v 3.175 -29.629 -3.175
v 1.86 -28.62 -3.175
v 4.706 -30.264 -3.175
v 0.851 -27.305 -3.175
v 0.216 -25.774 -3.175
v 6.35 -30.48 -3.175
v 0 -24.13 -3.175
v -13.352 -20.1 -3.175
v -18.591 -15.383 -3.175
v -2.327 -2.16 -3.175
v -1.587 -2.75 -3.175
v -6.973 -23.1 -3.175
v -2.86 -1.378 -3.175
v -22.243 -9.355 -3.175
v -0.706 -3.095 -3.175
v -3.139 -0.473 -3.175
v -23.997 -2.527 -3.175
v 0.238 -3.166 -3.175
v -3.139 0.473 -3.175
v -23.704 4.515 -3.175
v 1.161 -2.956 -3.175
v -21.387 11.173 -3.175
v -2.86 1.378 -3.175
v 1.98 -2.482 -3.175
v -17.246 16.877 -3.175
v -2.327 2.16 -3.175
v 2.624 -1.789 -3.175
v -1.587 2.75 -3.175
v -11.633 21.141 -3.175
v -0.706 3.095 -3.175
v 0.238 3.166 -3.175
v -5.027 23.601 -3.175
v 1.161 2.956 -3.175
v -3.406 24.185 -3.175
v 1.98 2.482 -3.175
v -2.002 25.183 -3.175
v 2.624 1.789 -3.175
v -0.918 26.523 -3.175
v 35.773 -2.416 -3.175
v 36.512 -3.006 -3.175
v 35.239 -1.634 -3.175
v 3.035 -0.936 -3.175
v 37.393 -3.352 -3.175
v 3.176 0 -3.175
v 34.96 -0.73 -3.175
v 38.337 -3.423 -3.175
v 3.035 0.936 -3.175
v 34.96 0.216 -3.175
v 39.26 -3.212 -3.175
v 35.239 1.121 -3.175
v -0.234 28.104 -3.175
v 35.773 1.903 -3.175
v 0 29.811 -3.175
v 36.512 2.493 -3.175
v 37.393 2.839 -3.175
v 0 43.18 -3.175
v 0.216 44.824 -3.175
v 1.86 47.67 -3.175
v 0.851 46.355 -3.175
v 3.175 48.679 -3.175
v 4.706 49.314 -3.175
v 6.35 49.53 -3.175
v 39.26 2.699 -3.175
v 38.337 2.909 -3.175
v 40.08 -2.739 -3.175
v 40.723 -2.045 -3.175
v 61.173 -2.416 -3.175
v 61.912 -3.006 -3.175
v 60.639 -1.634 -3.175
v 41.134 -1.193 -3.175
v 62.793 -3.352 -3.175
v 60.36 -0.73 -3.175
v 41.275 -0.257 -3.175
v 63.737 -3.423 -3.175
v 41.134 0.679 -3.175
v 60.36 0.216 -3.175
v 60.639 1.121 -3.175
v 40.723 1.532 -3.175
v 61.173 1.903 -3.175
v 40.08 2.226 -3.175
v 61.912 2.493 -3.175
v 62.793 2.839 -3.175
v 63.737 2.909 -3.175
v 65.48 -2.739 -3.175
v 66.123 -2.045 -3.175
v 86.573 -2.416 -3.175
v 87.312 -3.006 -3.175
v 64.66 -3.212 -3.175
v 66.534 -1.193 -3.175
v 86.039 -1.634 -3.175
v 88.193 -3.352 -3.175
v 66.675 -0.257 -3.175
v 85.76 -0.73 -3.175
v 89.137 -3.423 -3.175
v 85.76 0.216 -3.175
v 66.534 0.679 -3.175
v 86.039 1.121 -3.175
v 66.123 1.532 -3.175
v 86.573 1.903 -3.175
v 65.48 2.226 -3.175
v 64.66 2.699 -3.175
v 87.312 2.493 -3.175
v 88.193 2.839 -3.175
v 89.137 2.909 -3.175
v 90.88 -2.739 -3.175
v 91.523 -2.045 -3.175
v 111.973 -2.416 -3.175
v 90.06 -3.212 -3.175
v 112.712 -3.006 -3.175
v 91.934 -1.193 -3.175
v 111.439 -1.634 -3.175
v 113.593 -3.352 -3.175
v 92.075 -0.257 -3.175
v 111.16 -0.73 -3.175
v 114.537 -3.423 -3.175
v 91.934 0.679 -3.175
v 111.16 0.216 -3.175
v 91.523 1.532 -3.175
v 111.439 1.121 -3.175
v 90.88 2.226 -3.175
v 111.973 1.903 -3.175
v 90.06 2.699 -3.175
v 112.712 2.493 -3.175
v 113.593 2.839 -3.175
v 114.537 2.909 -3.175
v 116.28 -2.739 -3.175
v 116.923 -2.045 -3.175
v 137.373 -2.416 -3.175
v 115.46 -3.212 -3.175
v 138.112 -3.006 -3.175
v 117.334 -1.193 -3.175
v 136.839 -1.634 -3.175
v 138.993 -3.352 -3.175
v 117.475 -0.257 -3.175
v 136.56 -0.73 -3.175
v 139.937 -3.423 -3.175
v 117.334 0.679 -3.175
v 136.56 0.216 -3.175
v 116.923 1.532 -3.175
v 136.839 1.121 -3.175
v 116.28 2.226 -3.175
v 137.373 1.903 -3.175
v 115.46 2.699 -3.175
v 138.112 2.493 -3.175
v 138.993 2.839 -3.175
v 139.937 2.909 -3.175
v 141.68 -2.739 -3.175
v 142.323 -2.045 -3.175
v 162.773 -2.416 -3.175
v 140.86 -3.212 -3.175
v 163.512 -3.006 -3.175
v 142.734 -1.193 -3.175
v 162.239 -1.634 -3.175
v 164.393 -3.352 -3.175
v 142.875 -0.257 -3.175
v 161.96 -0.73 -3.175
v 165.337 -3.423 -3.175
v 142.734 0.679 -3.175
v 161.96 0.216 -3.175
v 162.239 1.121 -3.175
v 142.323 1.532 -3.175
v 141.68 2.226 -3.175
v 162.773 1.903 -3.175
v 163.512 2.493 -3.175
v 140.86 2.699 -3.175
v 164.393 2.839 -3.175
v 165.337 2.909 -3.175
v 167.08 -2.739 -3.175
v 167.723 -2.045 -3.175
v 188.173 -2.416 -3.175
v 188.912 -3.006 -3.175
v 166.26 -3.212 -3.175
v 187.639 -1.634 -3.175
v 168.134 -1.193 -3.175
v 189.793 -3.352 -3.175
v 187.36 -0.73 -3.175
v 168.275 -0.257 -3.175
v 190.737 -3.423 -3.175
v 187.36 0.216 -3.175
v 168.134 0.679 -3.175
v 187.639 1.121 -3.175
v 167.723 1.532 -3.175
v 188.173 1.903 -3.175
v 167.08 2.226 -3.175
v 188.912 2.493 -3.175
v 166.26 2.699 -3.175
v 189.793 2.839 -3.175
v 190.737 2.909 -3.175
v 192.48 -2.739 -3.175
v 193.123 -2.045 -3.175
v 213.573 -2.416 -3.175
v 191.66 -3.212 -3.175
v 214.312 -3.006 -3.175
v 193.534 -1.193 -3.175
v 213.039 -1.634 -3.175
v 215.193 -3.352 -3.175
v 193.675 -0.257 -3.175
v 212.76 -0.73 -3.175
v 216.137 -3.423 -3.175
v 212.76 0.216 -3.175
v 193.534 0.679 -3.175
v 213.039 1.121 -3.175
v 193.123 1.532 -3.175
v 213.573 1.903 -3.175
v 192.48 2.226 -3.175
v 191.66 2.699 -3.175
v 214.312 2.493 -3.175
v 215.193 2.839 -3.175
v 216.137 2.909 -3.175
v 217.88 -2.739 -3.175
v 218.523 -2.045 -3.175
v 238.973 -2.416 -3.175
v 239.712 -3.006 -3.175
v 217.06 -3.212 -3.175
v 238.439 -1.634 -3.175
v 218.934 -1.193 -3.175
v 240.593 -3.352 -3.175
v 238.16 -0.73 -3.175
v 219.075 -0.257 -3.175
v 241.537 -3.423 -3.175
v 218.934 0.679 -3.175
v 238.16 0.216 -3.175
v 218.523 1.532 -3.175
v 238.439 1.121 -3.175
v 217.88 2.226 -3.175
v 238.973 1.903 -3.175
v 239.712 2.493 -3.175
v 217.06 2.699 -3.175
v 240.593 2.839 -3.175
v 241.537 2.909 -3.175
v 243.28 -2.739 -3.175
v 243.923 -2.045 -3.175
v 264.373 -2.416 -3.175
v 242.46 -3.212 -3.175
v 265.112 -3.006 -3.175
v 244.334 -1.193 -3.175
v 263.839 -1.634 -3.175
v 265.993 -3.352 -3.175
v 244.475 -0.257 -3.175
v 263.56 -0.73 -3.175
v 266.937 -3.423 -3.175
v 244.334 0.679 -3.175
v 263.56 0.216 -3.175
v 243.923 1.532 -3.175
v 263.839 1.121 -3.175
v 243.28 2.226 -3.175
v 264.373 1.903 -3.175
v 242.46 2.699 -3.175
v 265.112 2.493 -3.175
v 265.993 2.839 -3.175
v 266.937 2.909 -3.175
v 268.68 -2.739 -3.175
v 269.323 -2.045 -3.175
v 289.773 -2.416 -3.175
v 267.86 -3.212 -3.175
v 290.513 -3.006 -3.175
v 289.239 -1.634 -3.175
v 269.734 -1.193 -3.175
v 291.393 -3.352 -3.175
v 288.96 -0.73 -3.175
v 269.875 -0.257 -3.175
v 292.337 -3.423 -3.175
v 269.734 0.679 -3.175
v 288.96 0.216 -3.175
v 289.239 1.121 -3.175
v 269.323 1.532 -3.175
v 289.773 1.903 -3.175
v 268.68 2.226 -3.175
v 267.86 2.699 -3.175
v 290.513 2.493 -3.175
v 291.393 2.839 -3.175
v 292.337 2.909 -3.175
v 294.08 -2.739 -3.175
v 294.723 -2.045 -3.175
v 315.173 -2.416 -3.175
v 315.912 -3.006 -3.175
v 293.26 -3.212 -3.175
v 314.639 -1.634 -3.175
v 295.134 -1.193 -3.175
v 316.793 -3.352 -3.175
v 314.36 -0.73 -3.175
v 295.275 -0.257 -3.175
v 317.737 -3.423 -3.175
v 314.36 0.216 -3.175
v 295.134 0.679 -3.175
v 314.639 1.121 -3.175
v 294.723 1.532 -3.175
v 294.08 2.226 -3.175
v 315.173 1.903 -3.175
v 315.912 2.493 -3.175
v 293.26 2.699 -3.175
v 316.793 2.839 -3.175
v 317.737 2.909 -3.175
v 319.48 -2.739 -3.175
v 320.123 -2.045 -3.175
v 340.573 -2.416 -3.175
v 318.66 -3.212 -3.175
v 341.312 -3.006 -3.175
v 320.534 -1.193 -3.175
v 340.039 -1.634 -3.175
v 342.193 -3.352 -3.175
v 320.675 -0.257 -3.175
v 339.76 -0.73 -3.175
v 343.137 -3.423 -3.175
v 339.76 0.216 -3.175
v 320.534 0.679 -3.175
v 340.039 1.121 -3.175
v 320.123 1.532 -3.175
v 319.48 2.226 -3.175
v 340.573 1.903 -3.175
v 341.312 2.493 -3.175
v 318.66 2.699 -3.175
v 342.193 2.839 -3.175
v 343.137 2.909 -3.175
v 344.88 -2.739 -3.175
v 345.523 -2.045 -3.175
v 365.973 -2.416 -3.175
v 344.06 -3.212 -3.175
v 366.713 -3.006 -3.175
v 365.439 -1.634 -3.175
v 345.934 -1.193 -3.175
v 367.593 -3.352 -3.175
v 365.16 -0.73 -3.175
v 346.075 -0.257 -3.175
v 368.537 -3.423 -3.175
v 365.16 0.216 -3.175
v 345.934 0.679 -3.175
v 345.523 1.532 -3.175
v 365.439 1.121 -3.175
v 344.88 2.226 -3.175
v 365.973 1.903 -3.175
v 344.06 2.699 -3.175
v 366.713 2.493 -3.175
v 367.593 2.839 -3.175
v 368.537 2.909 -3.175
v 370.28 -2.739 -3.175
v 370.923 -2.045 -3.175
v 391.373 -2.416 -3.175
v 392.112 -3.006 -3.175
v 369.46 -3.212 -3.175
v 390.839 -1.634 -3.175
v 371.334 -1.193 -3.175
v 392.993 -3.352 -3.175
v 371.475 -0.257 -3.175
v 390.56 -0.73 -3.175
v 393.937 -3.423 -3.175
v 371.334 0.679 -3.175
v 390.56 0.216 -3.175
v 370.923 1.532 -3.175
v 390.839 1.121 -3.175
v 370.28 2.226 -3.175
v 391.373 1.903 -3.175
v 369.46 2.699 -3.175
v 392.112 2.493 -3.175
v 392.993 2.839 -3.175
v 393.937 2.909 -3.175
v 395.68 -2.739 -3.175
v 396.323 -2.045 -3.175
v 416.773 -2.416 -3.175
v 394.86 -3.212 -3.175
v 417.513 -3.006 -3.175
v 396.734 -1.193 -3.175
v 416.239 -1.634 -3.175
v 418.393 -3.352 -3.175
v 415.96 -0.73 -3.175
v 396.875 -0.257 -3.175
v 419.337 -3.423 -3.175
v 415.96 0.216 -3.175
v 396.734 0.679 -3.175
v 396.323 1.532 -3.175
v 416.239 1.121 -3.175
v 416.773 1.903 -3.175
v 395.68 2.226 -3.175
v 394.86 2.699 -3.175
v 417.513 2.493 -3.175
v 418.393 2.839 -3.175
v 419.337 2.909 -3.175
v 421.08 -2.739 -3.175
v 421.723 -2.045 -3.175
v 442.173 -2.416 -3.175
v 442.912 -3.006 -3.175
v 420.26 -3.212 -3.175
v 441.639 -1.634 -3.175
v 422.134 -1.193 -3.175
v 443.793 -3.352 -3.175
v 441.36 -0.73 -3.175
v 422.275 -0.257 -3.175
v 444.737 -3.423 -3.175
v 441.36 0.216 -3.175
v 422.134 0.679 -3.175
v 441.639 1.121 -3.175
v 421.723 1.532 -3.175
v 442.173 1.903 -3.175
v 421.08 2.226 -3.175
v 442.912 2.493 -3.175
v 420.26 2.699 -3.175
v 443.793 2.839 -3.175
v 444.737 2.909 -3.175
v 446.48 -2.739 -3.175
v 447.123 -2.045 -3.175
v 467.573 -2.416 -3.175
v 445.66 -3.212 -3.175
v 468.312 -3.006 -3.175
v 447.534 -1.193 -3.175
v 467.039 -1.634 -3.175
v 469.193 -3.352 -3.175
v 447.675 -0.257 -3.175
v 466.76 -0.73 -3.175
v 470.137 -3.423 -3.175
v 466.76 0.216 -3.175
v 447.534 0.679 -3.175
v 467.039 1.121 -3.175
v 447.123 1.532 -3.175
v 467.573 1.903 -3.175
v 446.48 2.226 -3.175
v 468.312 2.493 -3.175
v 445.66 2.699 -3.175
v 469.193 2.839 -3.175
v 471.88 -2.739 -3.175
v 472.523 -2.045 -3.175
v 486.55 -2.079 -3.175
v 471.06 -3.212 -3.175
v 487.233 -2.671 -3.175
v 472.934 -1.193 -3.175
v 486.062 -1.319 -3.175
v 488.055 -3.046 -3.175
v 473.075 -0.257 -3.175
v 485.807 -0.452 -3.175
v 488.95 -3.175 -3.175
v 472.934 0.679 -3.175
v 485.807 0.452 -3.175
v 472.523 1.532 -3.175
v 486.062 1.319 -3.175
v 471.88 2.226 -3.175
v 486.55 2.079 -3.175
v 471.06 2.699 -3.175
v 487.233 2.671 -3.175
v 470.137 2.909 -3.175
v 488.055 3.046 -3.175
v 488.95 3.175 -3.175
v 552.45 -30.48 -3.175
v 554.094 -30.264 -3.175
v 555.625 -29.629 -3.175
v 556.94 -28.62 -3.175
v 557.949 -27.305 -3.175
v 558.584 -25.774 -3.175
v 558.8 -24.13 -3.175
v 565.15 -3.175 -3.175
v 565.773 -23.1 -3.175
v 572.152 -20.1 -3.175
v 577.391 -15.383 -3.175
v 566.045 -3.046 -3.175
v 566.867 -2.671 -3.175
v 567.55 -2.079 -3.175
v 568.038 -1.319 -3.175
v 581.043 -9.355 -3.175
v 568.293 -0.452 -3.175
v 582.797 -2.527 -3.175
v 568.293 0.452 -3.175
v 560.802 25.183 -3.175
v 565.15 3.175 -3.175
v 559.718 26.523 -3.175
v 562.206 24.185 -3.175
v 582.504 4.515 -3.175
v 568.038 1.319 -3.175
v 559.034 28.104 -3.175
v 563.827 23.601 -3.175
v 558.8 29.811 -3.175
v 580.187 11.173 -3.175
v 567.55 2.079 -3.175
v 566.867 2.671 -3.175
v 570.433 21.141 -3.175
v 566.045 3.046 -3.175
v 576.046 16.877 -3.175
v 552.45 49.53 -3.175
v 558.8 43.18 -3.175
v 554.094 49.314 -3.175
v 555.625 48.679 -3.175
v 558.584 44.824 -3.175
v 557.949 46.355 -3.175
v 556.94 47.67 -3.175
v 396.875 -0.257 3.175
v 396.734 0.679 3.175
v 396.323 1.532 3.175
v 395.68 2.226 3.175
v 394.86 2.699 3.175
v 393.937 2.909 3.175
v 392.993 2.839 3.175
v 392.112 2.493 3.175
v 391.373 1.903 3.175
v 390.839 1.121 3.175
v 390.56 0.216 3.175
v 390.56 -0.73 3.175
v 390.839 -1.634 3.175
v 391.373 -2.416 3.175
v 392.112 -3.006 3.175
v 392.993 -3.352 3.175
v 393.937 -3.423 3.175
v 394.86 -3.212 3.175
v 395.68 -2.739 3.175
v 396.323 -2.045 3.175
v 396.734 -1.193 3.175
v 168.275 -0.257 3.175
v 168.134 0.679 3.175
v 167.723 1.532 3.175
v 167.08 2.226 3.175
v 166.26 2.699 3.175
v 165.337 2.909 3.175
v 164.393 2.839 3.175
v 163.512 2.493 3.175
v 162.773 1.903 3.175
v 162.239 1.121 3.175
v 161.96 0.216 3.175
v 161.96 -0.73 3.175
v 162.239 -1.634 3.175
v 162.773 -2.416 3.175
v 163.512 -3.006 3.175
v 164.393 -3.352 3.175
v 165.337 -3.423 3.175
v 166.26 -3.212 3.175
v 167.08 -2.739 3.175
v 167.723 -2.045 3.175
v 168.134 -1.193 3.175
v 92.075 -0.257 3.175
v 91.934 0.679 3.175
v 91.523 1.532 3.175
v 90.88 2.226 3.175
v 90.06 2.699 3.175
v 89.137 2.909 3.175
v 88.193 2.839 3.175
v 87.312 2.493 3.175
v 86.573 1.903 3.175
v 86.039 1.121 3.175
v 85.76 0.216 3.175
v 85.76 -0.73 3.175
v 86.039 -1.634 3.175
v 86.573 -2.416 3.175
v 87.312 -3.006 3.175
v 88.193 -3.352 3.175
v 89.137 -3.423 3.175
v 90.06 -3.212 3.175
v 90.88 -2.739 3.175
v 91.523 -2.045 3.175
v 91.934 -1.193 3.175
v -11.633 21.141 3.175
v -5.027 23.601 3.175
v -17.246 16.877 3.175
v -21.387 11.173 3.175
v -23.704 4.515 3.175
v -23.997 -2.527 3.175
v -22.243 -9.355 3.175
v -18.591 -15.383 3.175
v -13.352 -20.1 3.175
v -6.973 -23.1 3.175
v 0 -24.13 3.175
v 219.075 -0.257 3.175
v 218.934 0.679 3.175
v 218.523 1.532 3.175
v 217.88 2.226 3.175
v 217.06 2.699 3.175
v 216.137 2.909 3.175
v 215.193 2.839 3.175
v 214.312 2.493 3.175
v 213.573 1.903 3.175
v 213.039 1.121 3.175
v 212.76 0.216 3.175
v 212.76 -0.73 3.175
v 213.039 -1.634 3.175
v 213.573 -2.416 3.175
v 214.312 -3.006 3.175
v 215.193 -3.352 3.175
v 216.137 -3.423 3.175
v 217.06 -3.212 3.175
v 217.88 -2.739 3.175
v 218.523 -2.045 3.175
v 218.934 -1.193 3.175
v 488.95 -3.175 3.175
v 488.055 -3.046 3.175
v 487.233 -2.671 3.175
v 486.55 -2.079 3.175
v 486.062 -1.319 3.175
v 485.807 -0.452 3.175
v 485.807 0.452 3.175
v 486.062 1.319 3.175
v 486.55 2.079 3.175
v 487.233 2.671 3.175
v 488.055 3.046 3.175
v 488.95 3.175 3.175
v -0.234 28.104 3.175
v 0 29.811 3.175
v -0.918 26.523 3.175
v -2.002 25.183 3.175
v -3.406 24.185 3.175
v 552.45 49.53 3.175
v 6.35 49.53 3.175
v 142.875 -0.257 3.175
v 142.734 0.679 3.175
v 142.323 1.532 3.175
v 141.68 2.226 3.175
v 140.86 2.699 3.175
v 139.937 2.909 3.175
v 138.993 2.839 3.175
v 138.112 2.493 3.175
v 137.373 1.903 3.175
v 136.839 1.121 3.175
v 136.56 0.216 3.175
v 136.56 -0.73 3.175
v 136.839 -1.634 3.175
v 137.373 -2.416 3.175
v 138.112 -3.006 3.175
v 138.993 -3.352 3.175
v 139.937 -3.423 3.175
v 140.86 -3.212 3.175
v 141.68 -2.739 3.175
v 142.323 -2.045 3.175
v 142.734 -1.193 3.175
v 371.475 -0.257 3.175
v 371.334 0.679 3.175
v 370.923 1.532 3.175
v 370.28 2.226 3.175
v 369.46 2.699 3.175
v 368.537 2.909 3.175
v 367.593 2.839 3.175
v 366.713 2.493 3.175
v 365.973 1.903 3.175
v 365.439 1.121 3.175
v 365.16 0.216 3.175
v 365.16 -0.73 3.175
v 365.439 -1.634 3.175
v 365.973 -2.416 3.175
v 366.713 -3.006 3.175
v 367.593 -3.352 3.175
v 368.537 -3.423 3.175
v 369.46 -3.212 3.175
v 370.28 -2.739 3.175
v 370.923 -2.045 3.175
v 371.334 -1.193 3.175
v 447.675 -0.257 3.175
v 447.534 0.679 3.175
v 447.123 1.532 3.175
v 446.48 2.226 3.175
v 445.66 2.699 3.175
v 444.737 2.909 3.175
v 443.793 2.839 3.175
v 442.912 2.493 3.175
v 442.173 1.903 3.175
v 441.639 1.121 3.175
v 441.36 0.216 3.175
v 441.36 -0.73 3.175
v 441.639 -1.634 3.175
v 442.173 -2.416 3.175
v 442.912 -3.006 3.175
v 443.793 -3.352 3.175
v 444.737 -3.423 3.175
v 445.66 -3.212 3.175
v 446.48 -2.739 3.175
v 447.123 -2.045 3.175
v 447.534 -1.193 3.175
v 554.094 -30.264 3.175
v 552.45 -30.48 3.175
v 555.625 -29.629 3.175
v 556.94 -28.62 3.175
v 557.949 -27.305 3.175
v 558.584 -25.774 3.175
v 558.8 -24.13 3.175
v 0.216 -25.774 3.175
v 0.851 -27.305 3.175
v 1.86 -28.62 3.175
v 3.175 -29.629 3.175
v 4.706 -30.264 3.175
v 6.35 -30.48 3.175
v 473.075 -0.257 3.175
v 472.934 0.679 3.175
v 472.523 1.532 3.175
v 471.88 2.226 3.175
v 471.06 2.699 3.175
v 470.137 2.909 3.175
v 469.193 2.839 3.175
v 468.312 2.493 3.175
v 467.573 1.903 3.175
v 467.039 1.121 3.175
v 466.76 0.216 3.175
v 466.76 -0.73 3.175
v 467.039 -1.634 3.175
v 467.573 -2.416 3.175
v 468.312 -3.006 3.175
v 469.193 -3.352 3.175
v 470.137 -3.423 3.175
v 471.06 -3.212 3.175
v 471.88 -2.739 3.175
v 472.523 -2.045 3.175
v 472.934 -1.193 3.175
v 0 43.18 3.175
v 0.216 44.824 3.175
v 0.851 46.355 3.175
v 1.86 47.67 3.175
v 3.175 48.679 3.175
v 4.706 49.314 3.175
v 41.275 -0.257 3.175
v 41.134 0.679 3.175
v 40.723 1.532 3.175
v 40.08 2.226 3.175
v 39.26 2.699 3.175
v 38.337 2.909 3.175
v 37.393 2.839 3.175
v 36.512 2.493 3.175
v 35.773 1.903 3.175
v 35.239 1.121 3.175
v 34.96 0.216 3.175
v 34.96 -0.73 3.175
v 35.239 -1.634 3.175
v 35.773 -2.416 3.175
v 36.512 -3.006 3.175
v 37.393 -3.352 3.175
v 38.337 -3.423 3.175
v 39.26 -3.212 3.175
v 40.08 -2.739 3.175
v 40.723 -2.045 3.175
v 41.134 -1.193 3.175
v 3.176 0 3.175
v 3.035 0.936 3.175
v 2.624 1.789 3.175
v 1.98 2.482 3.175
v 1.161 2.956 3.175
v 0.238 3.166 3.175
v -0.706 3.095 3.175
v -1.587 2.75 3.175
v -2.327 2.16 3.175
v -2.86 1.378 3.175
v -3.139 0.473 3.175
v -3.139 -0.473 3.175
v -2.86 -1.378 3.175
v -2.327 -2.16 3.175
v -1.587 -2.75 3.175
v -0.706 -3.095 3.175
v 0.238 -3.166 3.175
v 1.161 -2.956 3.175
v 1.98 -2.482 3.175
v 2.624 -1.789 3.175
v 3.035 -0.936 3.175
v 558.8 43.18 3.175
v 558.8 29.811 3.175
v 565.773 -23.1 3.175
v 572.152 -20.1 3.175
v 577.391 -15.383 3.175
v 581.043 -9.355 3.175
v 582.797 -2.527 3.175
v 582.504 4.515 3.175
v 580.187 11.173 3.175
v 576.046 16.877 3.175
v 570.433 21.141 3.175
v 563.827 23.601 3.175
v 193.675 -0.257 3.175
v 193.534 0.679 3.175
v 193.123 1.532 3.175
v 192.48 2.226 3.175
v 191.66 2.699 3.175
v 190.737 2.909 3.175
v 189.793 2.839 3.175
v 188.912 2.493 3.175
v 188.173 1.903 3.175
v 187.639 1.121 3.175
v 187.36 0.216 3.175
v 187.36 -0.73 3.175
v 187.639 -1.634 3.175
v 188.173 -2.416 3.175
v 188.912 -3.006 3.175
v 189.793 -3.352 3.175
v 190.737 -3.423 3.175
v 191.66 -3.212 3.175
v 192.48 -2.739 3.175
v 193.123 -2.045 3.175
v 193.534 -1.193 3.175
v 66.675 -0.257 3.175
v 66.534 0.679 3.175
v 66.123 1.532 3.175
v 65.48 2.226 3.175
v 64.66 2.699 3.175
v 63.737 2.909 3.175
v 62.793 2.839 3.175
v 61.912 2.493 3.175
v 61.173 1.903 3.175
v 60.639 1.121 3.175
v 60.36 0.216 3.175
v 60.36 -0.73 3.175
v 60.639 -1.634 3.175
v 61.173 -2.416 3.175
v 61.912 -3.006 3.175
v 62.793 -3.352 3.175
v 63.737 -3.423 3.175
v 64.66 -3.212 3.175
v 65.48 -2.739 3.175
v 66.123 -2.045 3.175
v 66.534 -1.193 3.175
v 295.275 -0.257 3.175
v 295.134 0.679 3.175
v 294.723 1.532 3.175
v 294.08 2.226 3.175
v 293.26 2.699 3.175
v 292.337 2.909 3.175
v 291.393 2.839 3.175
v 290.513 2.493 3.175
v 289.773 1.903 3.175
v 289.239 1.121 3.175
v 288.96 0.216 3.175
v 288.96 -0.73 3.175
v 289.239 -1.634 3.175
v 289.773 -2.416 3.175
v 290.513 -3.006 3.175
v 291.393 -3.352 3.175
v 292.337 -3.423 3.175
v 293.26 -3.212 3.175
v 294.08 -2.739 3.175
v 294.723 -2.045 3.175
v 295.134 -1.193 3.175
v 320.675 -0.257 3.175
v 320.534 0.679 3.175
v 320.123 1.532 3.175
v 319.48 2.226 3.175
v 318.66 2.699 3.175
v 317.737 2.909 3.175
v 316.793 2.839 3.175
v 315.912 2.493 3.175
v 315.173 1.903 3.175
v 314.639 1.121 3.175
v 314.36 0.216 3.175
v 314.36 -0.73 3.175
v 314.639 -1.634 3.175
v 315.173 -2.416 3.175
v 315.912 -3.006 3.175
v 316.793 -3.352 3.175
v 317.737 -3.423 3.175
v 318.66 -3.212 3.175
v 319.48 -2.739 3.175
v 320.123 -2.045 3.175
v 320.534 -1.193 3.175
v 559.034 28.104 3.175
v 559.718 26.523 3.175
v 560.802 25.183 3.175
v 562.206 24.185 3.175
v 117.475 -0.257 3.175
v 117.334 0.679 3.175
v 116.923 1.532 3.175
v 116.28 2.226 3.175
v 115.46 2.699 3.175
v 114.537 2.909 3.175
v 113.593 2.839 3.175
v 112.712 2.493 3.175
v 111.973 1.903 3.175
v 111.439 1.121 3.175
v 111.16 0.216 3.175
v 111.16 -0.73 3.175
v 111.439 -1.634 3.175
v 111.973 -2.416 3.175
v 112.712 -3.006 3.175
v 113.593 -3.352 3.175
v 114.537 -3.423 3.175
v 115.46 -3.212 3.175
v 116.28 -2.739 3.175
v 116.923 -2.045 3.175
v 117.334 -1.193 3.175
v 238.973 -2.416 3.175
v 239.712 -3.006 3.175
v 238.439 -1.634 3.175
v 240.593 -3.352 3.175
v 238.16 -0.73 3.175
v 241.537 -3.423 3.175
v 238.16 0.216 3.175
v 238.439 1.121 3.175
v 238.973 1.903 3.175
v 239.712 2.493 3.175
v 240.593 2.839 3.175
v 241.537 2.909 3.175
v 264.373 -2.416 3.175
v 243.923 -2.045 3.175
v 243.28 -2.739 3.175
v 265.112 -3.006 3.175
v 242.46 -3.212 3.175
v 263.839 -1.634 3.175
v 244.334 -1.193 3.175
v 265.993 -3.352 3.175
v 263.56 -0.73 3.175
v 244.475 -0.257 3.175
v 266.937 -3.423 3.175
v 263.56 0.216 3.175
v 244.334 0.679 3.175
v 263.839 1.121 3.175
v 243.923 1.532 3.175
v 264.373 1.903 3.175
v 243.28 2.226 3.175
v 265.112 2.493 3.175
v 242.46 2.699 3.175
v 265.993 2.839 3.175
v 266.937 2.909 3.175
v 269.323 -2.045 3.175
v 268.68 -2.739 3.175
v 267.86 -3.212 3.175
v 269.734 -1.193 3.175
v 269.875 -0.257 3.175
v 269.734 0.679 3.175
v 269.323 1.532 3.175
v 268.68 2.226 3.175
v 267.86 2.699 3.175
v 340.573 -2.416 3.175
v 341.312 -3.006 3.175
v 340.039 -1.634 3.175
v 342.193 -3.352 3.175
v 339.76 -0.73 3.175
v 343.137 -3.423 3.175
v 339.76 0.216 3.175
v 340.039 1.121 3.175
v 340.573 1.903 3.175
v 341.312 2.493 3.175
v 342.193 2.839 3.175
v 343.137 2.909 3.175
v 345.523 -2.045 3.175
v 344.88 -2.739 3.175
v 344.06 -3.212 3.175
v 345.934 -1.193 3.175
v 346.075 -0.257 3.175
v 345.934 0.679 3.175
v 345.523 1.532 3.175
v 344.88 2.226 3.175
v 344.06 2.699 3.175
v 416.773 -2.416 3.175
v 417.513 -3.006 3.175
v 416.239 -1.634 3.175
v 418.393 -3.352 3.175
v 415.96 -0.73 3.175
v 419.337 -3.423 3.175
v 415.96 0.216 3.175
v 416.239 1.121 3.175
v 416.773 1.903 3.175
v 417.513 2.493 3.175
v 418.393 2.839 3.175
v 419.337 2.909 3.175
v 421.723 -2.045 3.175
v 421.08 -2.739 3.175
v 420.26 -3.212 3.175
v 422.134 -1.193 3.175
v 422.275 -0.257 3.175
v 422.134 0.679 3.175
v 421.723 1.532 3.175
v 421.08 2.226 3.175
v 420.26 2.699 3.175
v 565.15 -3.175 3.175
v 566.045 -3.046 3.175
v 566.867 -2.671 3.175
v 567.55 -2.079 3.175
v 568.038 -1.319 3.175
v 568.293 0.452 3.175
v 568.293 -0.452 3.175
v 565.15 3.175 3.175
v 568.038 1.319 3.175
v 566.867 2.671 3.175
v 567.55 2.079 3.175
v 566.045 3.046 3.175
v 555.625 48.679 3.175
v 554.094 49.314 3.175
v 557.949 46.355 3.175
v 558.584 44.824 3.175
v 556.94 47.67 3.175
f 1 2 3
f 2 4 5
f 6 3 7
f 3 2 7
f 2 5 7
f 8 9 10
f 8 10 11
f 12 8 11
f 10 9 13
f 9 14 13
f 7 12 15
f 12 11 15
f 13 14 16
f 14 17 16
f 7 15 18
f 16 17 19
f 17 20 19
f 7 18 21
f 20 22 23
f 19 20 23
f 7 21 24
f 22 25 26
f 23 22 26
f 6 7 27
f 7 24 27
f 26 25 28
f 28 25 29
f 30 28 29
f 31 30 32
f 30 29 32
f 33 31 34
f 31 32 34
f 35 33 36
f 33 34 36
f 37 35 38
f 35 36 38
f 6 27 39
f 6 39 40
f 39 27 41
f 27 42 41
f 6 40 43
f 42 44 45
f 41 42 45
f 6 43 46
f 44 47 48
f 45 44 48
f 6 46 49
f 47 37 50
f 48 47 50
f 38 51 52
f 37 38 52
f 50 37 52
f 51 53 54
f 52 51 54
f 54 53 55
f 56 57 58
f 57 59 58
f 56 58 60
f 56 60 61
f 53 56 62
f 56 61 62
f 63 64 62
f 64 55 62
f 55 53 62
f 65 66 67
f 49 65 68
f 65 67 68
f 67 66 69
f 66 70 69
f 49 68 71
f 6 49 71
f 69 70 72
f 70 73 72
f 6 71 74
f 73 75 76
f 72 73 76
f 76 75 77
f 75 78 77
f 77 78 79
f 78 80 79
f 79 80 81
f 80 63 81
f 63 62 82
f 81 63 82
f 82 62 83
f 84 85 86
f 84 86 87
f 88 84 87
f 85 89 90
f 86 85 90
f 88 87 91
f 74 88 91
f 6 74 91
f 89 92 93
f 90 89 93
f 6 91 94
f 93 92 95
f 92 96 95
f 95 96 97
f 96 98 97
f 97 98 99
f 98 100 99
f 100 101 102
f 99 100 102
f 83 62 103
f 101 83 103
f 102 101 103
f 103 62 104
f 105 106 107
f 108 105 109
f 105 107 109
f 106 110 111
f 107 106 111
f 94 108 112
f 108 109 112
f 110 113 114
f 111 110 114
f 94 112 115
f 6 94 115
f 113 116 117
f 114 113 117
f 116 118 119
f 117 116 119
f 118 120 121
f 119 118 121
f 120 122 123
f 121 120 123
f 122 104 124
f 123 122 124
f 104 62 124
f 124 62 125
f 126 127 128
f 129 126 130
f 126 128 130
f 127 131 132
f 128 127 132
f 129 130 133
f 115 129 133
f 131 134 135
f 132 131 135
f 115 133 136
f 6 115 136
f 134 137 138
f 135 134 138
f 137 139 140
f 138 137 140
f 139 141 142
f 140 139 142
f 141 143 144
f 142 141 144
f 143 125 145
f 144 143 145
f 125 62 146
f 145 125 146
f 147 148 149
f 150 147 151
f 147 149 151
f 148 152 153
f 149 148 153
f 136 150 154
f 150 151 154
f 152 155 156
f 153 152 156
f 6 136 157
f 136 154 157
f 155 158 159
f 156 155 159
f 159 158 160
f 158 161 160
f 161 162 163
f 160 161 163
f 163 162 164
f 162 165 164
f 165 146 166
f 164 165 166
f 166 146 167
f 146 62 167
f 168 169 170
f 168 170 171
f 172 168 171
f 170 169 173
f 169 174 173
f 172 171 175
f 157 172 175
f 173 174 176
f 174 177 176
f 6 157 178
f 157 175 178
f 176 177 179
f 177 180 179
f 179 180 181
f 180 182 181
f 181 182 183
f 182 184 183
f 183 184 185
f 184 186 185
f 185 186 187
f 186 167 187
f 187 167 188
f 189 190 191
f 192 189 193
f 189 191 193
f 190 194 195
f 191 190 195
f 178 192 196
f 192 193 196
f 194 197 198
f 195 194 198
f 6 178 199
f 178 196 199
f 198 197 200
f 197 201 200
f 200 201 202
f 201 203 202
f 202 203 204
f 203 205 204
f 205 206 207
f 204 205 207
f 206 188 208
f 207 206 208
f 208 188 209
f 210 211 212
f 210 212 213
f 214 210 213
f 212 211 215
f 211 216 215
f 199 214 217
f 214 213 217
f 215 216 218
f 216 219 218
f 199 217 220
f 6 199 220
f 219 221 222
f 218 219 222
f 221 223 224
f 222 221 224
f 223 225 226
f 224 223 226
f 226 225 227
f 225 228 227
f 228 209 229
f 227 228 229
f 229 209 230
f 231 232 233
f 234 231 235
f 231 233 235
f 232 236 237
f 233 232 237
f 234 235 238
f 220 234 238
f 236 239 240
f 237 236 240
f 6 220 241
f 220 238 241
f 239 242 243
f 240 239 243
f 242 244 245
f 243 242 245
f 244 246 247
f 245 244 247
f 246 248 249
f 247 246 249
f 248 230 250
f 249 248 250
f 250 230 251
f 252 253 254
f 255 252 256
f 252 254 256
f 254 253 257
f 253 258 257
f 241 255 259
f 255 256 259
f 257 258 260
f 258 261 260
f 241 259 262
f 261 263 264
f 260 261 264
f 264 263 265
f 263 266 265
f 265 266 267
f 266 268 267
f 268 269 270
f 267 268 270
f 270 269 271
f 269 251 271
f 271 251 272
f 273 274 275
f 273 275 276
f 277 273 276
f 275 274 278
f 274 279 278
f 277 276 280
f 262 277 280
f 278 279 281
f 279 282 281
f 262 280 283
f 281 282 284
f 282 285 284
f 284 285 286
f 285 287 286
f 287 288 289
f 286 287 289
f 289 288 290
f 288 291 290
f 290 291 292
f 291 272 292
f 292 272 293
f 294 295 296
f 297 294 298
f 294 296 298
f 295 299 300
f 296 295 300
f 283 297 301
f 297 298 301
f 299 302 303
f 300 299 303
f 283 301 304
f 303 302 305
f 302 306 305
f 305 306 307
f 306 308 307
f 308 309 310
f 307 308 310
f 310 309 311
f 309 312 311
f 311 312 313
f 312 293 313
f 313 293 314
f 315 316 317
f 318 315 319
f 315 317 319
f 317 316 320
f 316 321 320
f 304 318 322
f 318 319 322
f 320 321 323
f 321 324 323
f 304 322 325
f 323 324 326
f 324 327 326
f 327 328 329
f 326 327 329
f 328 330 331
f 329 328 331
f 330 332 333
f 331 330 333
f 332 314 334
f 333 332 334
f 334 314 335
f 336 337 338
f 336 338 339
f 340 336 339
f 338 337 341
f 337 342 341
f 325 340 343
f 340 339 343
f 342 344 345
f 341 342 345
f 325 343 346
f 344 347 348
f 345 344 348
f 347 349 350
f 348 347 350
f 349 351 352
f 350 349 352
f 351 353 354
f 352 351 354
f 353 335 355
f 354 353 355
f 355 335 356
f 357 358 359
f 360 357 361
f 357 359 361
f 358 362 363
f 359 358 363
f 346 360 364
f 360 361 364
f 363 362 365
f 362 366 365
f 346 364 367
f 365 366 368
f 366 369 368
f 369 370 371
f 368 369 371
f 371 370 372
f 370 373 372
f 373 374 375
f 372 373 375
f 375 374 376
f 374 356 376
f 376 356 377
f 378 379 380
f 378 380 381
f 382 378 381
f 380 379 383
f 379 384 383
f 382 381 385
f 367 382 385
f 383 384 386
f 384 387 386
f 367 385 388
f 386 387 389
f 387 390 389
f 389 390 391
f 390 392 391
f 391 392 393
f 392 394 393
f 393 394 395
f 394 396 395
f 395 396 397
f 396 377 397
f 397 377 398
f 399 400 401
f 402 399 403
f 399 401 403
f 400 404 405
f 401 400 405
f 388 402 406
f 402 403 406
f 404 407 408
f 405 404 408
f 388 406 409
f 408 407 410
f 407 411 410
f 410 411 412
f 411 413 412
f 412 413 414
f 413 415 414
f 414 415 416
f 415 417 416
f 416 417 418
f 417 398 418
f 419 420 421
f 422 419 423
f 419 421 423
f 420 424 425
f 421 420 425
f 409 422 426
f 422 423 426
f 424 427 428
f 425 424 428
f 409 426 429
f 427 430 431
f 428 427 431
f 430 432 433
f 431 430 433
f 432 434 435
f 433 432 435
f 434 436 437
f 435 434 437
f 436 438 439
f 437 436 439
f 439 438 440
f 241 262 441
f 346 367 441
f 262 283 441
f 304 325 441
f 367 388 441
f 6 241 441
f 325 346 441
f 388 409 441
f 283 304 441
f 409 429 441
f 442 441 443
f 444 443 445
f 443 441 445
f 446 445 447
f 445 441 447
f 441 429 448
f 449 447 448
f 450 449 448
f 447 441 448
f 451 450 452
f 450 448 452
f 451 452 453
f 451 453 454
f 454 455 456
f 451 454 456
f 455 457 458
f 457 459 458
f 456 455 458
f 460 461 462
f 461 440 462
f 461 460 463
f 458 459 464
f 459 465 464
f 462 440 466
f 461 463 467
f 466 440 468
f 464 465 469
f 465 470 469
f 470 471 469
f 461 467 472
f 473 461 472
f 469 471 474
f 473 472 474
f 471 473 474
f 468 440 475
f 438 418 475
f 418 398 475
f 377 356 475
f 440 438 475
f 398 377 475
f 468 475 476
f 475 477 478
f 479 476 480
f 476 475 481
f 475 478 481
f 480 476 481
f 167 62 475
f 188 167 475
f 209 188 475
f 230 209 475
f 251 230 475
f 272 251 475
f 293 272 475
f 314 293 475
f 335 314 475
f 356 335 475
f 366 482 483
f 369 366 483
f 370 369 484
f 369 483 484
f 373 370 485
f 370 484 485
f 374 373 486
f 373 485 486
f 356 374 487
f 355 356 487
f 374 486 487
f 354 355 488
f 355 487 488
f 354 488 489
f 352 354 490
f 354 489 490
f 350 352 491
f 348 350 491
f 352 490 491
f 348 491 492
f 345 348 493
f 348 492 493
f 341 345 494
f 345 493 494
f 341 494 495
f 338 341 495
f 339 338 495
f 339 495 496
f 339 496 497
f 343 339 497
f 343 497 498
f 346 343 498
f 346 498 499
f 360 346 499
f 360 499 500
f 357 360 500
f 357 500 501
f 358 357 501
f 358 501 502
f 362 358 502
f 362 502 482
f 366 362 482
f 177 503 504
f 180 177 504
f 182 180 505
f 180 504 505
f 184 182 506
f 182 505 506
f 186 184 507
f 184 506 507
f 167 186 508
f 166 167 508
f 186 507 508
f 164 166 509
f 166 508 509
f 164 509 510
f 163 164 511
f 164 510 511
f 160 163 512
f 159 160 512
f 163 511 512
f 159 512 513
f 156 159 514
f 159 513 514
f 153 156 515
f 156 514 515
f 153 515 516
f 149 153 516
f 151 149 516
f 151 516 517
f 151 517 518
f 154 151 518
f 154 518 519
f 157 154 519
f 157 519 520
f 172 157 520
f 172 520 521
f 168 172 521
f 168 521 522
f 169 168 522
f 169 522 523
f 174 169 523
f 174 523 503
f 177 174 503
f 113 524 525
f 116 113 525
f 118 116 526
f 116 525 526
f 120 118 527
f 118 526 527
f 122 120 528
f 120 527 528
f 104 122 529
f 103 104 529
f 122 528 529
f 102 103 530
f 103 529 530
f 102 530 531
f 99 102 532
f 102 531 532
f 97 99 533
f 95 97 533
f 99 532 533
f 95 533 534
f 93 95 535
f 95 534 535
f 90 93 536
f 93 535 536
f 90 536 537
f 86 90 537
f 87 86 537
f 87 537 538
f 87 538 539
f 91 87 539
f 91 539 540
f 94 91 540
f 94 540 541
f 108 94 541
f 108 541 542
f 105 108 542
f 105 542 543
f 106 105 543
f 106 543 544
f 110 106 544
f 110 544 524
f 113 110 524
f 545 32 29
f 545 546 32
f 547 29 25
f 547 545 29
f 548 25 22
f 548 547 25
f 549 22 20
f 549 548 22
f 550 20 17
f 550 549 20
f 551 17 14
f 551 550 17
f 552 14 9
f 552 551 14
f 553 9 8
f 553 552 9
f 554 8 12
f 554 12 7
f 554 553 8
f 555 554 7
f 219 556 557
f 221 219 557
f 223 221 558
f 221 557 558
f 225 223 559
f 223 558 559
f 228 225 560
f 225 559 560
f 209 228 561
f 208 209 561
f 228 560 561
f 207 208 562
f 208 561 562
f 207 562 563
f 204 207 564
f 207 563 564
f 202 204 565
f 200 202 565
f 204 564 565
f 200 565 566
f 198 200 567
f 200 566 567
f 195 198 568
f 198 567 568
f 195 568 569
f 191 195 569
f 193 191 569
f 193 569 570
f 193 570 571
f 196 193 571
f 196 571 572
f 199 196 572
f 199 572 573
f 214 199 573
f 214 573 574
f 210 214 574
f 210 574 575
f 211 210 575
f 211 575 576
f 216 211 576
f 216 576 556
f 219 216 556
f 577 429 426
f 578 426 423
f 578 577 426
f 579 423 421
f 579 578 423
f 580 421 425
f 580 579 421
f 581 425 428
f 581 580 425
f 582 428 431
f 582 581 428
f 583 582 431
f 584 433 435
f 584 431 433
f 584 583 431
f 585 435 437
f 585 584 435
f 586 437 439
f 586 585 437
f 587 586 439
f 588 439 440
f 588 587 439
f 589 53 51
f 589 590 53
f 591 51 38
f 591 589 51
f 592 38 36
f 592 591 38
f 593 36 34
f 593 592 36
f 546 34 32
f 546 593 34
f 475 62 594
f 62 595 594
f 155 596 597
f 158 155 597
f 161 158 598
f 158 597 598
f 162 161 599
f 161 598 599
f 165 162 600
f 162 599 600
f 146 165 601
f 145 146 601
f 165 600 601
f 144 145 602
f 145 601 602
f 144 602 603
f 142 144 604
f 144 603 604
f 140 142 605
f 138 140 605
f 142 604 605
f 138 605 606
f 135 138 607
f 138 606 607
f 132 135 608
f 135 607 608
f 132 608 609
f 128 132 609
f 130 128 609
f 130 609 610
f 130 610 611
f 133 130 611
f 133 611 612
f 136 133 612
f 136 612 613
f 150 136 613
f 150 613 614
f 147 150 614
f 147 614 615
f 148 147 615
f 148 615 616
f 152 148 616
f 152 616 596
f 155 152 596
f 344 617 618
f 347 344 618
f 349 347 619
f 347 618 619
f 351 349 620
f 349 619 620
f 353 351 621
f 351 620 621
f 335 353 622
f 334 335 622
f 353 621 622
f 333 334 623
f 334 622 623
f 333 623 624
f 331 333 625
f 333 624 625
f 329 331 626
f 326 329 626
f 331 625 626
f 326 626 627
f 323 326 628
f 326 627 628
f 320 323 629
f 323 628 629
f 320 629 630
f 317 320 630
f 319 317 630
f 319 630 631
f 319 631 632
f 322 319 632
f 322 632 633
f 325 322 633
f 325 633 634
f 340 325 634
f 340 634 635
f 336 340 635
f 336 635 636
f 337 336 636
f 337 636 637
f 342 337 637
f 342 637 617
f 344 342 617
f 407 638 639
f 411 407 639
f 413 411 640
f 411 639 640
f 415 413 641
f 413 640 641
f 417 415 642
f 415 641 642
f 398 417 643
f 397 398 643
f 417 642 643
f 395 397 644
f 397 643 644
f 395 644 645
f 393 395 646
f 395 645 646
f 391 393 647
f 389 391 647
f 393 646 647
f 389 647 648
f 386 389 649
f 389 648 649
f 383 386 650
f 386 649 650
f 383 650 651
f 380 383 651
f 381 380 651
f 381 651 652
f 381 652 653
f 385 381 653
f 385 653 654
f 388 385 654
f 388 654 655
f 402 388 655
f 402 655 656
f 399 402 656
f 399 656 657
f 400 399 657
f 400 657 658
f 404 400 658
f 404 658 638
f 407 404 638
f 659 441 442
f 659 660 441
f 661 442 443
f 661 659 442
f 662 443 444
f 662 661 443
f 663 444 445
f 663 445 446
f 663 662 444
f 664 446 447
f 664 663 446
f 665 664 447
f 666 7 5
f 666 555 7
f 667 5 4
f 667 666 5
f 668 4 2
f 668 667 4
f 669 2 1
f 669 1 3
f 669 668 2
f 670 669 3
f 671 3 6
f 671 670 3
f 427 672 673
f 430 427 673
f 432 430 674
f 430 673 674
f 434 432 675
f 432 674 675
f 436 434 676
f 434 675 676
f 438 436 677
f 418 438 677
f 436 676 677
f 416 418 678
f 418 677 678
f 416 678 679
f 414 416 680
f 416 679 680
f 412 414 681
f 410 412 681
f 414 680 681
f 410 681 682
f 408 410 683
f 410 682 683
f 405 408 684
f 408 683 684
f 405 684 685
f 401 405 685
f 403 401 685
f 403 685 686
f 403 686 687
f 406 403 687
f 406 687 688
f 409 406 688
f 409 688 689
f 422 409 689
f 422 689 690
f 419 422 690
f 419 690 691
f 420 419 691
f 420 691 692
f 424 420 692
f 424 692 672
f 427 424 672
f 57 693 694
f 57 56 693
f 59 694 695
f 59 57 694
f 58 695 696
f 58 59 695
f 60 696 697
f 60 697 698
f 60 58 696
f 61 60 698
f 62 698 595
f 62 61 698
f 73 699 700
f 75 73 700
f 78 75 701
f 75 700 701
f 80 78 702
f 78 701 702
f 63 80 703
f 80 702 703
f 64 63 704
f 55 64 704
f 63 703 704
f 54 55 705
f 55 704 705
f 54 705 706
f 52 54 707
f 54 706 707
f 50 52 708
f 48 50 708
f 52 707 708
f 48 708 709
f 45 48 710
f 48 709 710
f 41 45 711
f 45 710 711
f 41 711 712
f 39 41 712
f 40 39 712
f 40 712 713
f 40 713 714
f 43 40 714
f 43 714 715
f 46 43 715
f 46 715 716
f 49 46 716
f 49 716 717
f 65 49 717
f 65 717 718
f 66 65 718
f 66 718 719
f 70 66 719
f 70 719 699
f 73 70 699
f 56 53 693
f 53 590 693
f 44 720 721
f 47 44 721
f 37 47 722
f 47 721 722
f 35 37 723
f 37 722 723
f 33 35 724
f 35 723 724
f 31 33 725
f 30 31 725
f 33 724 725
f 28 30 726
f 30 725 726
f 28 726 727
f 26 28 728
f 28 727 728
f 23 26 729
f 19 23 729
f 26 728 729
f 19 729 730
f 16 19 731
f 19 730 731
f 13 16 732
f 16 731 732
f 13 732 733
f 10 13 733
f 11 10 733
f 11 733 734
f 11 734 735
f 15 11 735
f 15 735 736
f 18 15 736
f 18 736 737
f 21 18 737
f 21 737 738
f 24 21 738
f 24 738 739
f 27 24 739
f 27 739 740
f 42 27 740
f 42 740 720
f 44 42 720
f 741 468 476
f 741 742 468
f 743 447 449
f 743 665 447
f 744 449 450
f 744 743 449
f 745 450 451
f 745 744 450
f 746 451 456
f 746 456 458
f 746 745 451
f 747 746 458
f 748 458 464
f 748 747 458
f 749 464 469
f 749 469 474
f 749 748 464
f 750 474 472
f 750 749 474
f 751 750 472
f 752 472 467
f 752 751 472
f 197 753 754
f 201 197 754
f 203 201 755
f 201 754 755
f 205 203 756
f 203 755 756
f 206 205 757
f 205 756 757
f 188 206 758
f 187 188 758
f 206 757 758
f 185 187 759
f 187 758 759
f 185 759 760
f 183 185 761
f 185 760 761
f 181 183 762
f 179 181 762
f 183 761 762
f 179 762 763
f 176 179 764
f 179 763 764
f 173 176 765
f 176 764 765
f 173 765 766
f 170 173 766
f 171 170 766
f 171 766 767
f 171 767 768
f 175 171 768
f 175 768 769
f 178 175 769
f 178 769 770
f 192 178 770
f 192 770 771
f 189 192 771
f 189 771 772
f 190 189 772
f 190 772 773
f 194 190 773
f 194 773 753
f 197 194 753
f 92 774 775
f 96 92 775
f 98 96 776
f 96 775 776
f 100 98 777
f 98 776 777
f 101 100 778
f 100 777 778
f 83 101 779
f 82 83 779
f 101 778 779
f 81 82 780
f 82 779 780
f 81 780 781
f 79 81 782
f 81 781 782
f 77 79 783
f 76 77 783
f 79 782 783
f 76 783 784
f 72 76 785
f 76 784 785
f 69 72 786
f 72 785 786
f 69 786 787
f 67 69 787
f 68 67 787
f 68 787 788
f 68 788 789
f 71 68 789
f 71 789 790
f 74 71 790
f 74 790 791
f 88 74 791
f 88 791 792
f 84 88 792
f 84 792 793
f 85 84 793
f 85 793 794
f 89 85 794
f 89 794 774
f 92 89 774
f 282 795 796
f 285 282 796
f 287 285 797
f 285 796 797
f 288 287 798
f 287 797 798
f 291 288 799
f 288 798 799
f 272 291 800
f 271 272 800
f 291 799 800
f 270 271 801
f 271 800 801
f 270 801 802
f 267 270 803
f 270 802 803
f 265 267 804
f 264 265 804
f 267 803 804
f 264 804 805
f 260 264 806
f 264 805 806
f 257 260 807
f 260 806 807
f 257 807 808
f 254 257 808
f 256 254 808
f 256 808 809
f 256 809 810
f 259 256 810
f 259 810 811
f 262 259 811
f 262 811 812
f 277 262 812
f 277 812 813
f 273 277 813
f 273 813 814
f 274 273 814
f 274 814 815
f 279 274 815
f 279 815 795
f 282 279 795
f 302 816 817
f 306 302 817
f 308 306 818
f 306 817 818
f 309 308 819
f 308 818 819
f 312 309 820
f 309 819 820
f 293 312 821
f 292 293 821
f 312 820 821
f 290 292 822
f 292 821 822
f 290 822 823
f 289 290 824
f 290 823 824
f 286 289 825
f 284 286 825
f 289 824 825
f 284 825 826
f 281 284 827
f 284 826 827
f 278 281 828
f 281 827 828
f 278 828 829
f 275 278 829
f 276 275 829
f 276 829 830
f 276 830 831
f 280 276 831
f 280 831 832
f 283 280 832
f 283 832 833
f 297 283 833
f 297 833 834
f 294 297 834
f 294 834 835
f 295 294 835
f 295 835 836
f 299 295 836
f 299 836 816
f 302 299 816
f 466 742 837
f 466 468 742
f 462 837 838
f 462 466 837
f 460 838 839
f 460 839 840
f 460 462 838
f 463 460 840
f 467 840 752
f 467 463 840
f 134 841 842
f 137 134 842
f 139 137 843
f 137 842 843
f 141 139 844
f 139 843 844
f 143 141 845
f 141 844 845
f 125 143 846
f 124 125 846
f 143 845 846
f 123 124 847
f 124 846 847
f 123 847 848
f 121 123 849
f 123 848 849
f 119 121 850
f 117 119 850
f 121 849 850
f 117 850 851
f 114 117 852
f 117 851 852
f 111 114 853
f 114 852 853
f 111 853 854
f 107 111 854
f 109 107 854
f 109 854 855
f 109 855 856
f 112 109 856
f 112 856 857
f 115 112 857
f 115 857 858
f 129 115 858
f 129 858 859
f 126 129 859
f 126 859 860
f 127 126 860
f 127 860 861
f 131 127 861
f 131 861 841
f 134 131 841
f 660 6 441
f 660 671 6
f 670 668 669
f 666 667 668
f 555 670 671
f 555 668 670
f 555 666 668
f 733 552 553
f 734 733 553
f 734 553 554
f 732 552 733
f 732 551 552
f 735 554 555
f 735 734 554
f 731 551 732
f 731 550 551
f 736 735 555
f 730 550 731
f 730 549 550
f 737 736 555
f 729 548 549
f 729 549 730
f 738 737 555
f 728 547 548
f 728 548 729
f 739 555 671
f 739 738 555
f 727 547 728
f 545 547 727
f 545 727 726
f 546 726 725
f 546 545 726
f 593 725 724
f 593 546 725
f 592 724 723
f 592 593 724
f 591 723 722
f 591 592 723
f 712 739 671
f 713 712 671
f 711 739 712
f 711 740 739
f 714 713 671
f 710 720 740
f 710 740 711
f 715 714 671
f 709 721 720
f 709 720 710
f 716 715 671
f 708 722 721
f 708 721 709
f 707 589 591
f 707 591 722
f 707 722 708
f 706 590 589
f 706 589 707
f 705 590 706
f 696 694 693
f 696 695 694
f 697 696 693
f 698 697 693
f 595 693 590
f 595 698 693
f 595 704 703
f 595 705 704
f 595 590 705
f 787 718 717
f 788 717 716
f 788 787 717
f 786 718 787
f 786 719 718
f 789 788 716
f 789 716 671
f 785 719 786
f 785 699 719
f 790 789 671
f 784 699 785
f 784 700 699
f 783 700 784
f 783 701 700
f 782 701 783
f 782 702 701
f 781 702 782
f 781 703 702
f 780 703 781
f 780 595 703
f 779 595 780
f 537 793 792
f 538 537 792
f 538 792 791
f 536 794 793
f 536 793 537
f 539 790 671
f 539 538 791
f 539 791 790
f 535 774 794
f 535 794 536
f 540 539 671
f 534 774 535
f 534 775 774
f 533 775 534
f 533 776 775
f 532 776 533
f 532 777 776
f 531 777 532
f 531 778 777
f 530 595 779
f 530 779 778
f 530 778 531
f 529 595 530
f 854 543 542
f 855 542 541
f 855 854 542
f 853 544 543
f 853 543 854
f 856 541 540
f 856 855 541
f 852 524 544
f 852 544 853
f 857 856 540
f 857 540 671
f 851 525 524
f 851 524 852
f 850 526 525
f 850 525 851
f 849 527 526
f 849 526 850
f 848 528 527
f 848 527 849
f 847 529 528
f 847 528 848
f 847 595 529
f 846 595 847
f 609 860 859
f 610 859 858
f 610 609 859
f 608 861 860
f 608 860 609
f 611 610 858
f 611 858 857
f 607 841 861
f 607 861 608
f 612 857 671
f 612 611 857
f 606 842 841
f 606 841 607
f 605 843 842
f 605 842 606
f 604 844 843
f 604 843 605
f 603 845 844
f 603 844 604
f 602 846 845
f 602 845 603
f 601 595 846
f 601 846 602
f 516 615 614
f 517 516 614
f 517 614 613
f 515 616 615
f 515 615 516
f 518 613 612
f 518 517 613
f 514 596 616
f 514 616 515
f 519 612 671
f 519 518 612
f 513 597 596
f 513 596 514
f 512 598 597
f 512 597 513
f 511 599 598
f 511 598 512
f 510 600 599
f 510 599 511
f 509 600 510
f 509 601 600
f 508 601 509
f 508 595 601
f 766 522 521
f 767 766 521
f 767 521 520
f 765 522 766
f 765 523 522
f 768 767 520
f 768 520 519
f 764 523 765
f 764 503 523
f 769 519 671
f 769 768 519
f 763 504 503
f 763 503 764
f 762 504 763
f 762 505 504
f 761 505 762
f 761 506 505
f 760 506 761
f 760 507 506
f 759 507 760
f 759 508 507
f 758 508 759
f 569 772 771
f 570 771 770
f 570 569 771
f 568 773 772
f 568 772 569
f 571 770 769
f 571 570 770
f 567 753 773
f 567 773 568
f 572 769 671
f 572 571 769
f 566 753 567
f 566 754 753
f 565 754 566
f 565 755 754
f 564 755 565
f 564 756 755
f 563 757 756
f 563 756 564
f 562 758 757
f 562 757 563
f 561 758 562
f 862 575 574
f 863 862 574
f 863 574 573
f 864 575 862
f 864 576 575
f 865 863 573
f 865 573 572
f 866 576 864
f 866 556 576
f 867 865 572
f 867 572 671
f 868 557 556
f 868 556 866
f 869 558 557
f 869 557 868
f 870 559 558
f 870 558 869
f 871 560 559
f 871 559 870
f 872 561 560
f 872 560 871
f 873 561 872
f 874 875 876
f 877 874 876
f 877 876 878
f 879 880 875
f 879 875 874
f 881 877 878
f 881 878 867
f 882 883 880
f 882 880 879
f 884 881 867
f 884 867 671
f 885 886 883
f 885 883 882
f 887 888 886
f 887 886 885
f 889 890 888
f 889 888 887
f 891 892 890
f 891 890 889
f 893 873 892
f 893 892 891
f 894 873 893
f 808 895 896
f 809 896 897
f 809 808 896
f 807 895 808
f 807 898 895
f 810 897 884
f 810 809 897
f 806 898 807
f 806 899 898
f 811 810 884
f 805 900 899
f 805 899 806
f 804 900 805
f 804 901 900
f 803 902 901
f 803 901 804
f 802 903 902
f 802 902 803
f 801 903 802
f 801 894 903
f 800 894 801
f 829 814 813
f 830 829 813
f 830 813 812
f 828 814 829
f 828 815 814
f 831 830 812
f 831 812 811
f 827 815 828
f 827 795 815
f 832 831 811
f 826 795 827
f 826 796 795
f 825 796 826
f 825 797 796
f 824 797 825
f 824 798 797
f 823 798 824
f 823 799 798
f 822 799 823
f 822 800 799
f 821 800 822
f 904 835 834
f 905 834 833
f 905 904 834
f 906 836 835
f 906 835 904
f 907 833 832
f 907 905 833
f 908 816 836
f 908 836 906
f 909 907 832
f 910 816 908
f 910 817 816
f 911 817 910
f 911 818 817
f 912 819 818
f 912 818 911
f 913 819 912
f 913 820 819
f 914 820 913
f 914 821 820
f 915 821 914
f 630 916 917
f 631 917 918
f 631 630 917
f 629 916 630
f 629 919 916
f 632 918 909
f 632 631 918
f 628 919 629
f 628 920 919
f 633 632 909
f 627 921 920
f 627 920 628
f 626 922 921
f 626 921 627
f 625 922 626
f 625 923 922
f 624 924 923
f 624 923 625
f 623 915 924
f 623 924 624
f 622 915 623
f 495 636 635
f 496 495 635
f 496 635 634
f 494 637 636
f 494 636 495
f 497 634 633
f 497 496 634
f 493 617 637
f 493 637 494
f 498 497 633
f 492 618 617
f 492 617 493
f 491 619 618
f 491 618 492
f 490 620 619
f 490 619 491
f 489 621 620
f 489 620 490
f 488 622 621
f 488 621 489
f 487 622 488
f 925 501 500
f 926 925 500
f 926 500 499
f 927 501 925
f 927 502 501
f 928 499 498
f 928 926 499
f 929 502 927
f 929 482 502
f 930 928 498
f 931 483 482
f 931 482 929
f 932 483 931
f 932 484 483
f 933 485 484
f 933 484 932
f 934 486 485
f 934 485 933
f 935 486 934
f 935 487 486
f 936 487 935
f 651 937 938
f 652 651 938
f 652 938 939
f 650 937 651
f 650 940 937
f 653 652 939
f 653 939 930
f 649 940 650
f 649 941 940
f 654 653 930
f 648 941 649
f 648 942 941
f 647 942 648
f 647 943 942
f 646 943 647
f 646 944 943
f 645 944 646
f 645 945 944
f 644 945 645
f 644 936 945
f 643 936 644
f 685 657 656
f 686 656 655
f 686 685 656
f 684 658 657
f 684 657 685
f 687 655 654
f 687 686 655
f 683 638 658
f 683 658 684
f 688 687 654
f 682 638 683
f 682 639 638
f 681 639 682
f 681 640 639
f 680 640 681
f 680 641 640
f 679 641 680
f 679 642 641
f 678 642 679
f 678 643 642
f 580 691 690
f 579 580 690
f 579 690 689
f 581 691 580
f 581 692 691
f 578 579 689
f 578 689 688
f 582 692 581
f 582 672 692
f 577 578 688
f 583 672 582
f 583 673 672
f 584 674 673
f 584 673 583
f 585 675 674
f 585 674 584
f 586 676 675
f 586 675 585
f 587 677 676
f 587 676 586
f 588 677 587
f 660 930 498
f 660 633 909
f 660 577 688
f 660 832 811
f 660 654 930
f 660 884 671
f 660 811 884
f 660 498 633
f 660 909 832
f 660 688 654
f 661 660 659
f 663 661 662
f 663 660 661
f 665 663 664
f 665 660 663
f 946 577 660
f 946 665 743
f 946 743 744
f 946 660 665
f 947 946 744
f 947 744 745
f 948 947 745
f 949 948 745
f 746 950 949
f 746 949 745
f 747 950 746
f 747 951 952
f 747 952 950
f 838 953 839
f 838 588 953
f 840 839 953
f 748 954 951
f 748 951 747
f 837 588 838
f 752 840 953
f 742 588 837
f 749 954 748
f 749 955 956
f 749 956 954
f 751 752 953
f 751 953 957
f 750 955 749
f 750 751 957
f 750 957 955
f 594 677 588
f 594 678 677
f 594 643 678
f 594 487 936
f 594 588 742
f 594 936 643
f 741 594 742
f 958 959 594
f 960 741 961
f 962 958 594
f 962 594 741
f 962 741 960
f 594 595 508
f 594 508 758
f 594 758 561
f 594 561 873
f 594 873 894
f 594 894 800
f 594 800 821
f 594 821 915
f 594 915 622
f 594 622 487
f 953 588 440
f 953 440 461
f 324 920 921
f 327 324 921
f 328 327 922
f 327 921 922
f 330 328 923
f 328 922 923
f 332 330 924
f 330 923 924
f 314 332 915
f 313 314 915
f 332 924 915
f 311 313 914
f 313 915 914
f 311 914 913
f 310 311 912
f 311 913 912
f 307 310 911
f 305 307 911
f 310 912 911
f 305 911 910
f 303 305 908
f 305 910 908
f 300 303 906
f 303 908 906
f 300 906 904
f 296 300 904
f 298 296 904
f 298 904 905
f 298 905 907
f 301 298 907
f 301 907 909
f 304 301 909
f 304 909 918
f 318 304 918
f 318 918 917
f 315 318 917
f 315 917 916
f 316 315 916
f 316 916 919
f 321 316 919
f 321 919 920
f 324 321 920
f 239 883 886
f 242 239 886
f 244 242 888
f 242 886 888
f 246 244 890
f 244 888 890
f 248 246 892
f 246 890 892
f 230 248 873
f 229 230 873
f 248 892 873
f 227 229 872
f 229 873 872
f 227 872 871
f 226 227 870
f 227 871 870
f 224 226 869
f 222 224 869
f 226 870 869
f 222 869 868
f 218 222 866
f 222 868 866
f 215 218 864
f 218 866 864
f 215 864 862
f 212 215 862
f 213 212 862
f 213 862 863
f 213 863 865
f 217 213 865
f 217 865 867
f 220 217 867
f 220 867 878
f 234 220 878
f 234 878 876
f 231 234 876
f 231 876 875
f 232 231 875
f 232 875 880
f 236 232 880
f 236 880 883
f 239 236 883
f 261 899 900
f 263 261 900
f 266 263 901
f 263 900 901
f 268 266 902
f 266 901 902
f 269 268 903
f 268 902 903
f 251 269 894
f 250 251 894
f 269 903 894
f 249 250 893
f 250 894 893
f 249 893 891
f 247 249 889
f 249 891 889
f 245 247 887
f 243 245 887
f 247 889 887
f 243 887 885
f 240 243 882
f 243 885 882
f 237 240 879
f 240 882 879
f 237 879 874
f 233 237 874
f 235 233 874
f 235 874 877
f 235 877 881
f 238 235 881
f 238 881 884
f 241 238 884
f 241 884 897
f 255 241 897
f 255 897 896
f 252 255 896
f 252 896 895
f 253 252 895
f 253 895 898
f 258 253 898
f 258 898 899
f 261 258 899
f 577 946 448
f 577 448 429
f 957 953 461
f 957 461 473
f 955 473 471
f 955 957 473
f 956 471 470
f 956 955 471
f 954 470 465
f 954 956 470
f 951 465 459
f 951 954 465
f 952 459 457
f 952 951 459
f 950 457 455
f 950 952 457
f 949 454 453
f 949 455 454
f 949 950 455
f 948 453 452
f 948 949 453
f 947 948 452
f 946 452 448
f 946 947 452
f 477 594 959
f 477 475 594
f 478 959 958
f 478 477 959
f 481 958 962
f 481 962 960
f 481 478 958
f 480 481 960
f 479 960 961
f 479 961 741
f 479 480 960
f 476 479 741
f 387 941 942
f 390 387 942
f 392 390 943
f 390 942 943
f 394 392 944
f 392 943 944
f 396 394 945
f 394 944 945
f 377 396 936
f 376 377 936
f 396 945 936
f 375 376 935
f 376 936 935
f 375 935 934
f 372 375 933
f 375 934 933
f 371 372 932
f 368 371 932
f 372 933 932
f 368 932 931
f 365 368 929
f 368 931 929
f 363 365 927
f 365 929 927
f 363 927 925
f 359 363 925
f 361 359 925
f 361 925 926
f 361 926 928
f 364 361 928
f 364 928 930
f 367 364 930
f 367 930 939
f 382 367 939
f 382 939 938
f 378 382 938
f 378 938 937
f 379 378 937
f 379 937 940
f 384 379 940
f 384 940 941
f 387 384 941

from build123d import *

# Parameters (mm, degrees)
SKETCH1_W           = 558.8
SKETCH1_H           = 25.4
SKETCH1_H_2         = 6.35
BOSS_EXTRUDE1_DEPTH = 3.175
SKETCH2_R           = 3.175
CUT_EXTRUDE1_DEPTH  = 586.064892384
FILLET1_R           = 6.35


with BuildPart() as part:
    # Sketch1 → Boss-Extrude1 (new, symmetric)
    with BuildSketch(Plane.XY):
        with Locations((279.4, 36.83)):
            Rectangle(SKETCH1_W, SKETCH1_H)
        with BuildLine():
            Line((0, -24.13), (558.8, -24.13))
            ThreePointArc((558.8, -24.13), (582.93, 0), (558.8, 24.13))
            Line((558.8, 24.13), (0, 24.13))
            ThreePointArc((0, 24.13), (-24.13, 0), (0, -24.13))
        make_face()
        with Locations((279.4, -27.305)):
            Rectangle(SKETCH1_W, SKETCH1_H_2)
    extrude(amount=BOSS_EXTRUDE1_DEPTH, both=True)

    # Sketch2 → Cut-Extrude1 (cut, through all)
    with BuildSketch(Plane.XY.offset(3.175)):
        with Locations((0.000865133, 0)):
            Circle(SKETCH2_R)
        with Locations((38.1, -0.256753551)):
            Circle(SKETCH2_R)
        with Locations((63.5, -0.256753551)):
            Circle(SKETCH2_R)
        with Locations((88.9, -0.256753551)):
            Circle(SKETCH2_R)
        with Locations((114.3, -0.256753551)):
            Circle(SKETCH2_R)
        with Locations((139.7, -0.256753551)):
            Circle(SKETCH2_R)
        with Locations((165.1, -0.256753551)):
            Circle(SKETCH2_R)
        with Locations((190.5, -0.256753551)):
            Circle(SKETCH2_R)
        with Locations((215.9, -0.256753551)):
            Circle(SKETCH2_R)
        with Locations((241.3, -0.256753551)):
            Circle(SKETCH2_R)
        with Locations((266.7, -0.256753551)):
            Circle(SKETCH2_R)
        with Locations((292.1, -0.256753551)):
            Circle(SKETCH2_R)
        with Locations((317.5, -0.256753551)):
            Circle(SKETCH2_R)
        with Locations((342.9, -0.256753551)):
            Circle(SKETCH2_R)
        with Locations((368.3, -0.256753551)):
            Circle(SKETCH2_R)
        with Locations((393.7, -0.256753551)):
            Circle(SKETCH2_R)
        with Locations((419.1, -0.256753551)):
            Circle(SKETCH2_R)
        with Locations((444.5, -0.256753551)):
            Circle(SKETCH2_R)
        with Locations((469.9, -0.256753551)):
            Circle(SKETCH2_R)
        with BuildLine():
            Line((488.95, 3.175), (565.15, 3.175))
            ThreePointArc((565.15, 3.175), (568.325, 0), (565.15, -3.175))
            Line((565.15, -3.175), (488.95, -3.175))
            ThreePointArc((488.95, -3.175), (485.775, 0), (488.95, 3.175))
        make_face()
    extrude(amount=-CUT_EXTRUDE1_DEPTH, mode=Mode.SUBTRACT)

    # Fillet1
    fillet1_edges = [part.edges().sort_by_distance(p)[0] for p in [
        (558.8, 49.53, 0),
        (558.8, 24.13, 0),
        (0, 24.13, 0),
        (0, 49.53, 0),
        (0, -30.48, 0),
        (558.8, -30.48, 0),
    ]]
    fillet(fillet1_edges, radius=FILLET1_R - 0.0001)  # a hair under: the kernel refuses the full size


solid = part.part
